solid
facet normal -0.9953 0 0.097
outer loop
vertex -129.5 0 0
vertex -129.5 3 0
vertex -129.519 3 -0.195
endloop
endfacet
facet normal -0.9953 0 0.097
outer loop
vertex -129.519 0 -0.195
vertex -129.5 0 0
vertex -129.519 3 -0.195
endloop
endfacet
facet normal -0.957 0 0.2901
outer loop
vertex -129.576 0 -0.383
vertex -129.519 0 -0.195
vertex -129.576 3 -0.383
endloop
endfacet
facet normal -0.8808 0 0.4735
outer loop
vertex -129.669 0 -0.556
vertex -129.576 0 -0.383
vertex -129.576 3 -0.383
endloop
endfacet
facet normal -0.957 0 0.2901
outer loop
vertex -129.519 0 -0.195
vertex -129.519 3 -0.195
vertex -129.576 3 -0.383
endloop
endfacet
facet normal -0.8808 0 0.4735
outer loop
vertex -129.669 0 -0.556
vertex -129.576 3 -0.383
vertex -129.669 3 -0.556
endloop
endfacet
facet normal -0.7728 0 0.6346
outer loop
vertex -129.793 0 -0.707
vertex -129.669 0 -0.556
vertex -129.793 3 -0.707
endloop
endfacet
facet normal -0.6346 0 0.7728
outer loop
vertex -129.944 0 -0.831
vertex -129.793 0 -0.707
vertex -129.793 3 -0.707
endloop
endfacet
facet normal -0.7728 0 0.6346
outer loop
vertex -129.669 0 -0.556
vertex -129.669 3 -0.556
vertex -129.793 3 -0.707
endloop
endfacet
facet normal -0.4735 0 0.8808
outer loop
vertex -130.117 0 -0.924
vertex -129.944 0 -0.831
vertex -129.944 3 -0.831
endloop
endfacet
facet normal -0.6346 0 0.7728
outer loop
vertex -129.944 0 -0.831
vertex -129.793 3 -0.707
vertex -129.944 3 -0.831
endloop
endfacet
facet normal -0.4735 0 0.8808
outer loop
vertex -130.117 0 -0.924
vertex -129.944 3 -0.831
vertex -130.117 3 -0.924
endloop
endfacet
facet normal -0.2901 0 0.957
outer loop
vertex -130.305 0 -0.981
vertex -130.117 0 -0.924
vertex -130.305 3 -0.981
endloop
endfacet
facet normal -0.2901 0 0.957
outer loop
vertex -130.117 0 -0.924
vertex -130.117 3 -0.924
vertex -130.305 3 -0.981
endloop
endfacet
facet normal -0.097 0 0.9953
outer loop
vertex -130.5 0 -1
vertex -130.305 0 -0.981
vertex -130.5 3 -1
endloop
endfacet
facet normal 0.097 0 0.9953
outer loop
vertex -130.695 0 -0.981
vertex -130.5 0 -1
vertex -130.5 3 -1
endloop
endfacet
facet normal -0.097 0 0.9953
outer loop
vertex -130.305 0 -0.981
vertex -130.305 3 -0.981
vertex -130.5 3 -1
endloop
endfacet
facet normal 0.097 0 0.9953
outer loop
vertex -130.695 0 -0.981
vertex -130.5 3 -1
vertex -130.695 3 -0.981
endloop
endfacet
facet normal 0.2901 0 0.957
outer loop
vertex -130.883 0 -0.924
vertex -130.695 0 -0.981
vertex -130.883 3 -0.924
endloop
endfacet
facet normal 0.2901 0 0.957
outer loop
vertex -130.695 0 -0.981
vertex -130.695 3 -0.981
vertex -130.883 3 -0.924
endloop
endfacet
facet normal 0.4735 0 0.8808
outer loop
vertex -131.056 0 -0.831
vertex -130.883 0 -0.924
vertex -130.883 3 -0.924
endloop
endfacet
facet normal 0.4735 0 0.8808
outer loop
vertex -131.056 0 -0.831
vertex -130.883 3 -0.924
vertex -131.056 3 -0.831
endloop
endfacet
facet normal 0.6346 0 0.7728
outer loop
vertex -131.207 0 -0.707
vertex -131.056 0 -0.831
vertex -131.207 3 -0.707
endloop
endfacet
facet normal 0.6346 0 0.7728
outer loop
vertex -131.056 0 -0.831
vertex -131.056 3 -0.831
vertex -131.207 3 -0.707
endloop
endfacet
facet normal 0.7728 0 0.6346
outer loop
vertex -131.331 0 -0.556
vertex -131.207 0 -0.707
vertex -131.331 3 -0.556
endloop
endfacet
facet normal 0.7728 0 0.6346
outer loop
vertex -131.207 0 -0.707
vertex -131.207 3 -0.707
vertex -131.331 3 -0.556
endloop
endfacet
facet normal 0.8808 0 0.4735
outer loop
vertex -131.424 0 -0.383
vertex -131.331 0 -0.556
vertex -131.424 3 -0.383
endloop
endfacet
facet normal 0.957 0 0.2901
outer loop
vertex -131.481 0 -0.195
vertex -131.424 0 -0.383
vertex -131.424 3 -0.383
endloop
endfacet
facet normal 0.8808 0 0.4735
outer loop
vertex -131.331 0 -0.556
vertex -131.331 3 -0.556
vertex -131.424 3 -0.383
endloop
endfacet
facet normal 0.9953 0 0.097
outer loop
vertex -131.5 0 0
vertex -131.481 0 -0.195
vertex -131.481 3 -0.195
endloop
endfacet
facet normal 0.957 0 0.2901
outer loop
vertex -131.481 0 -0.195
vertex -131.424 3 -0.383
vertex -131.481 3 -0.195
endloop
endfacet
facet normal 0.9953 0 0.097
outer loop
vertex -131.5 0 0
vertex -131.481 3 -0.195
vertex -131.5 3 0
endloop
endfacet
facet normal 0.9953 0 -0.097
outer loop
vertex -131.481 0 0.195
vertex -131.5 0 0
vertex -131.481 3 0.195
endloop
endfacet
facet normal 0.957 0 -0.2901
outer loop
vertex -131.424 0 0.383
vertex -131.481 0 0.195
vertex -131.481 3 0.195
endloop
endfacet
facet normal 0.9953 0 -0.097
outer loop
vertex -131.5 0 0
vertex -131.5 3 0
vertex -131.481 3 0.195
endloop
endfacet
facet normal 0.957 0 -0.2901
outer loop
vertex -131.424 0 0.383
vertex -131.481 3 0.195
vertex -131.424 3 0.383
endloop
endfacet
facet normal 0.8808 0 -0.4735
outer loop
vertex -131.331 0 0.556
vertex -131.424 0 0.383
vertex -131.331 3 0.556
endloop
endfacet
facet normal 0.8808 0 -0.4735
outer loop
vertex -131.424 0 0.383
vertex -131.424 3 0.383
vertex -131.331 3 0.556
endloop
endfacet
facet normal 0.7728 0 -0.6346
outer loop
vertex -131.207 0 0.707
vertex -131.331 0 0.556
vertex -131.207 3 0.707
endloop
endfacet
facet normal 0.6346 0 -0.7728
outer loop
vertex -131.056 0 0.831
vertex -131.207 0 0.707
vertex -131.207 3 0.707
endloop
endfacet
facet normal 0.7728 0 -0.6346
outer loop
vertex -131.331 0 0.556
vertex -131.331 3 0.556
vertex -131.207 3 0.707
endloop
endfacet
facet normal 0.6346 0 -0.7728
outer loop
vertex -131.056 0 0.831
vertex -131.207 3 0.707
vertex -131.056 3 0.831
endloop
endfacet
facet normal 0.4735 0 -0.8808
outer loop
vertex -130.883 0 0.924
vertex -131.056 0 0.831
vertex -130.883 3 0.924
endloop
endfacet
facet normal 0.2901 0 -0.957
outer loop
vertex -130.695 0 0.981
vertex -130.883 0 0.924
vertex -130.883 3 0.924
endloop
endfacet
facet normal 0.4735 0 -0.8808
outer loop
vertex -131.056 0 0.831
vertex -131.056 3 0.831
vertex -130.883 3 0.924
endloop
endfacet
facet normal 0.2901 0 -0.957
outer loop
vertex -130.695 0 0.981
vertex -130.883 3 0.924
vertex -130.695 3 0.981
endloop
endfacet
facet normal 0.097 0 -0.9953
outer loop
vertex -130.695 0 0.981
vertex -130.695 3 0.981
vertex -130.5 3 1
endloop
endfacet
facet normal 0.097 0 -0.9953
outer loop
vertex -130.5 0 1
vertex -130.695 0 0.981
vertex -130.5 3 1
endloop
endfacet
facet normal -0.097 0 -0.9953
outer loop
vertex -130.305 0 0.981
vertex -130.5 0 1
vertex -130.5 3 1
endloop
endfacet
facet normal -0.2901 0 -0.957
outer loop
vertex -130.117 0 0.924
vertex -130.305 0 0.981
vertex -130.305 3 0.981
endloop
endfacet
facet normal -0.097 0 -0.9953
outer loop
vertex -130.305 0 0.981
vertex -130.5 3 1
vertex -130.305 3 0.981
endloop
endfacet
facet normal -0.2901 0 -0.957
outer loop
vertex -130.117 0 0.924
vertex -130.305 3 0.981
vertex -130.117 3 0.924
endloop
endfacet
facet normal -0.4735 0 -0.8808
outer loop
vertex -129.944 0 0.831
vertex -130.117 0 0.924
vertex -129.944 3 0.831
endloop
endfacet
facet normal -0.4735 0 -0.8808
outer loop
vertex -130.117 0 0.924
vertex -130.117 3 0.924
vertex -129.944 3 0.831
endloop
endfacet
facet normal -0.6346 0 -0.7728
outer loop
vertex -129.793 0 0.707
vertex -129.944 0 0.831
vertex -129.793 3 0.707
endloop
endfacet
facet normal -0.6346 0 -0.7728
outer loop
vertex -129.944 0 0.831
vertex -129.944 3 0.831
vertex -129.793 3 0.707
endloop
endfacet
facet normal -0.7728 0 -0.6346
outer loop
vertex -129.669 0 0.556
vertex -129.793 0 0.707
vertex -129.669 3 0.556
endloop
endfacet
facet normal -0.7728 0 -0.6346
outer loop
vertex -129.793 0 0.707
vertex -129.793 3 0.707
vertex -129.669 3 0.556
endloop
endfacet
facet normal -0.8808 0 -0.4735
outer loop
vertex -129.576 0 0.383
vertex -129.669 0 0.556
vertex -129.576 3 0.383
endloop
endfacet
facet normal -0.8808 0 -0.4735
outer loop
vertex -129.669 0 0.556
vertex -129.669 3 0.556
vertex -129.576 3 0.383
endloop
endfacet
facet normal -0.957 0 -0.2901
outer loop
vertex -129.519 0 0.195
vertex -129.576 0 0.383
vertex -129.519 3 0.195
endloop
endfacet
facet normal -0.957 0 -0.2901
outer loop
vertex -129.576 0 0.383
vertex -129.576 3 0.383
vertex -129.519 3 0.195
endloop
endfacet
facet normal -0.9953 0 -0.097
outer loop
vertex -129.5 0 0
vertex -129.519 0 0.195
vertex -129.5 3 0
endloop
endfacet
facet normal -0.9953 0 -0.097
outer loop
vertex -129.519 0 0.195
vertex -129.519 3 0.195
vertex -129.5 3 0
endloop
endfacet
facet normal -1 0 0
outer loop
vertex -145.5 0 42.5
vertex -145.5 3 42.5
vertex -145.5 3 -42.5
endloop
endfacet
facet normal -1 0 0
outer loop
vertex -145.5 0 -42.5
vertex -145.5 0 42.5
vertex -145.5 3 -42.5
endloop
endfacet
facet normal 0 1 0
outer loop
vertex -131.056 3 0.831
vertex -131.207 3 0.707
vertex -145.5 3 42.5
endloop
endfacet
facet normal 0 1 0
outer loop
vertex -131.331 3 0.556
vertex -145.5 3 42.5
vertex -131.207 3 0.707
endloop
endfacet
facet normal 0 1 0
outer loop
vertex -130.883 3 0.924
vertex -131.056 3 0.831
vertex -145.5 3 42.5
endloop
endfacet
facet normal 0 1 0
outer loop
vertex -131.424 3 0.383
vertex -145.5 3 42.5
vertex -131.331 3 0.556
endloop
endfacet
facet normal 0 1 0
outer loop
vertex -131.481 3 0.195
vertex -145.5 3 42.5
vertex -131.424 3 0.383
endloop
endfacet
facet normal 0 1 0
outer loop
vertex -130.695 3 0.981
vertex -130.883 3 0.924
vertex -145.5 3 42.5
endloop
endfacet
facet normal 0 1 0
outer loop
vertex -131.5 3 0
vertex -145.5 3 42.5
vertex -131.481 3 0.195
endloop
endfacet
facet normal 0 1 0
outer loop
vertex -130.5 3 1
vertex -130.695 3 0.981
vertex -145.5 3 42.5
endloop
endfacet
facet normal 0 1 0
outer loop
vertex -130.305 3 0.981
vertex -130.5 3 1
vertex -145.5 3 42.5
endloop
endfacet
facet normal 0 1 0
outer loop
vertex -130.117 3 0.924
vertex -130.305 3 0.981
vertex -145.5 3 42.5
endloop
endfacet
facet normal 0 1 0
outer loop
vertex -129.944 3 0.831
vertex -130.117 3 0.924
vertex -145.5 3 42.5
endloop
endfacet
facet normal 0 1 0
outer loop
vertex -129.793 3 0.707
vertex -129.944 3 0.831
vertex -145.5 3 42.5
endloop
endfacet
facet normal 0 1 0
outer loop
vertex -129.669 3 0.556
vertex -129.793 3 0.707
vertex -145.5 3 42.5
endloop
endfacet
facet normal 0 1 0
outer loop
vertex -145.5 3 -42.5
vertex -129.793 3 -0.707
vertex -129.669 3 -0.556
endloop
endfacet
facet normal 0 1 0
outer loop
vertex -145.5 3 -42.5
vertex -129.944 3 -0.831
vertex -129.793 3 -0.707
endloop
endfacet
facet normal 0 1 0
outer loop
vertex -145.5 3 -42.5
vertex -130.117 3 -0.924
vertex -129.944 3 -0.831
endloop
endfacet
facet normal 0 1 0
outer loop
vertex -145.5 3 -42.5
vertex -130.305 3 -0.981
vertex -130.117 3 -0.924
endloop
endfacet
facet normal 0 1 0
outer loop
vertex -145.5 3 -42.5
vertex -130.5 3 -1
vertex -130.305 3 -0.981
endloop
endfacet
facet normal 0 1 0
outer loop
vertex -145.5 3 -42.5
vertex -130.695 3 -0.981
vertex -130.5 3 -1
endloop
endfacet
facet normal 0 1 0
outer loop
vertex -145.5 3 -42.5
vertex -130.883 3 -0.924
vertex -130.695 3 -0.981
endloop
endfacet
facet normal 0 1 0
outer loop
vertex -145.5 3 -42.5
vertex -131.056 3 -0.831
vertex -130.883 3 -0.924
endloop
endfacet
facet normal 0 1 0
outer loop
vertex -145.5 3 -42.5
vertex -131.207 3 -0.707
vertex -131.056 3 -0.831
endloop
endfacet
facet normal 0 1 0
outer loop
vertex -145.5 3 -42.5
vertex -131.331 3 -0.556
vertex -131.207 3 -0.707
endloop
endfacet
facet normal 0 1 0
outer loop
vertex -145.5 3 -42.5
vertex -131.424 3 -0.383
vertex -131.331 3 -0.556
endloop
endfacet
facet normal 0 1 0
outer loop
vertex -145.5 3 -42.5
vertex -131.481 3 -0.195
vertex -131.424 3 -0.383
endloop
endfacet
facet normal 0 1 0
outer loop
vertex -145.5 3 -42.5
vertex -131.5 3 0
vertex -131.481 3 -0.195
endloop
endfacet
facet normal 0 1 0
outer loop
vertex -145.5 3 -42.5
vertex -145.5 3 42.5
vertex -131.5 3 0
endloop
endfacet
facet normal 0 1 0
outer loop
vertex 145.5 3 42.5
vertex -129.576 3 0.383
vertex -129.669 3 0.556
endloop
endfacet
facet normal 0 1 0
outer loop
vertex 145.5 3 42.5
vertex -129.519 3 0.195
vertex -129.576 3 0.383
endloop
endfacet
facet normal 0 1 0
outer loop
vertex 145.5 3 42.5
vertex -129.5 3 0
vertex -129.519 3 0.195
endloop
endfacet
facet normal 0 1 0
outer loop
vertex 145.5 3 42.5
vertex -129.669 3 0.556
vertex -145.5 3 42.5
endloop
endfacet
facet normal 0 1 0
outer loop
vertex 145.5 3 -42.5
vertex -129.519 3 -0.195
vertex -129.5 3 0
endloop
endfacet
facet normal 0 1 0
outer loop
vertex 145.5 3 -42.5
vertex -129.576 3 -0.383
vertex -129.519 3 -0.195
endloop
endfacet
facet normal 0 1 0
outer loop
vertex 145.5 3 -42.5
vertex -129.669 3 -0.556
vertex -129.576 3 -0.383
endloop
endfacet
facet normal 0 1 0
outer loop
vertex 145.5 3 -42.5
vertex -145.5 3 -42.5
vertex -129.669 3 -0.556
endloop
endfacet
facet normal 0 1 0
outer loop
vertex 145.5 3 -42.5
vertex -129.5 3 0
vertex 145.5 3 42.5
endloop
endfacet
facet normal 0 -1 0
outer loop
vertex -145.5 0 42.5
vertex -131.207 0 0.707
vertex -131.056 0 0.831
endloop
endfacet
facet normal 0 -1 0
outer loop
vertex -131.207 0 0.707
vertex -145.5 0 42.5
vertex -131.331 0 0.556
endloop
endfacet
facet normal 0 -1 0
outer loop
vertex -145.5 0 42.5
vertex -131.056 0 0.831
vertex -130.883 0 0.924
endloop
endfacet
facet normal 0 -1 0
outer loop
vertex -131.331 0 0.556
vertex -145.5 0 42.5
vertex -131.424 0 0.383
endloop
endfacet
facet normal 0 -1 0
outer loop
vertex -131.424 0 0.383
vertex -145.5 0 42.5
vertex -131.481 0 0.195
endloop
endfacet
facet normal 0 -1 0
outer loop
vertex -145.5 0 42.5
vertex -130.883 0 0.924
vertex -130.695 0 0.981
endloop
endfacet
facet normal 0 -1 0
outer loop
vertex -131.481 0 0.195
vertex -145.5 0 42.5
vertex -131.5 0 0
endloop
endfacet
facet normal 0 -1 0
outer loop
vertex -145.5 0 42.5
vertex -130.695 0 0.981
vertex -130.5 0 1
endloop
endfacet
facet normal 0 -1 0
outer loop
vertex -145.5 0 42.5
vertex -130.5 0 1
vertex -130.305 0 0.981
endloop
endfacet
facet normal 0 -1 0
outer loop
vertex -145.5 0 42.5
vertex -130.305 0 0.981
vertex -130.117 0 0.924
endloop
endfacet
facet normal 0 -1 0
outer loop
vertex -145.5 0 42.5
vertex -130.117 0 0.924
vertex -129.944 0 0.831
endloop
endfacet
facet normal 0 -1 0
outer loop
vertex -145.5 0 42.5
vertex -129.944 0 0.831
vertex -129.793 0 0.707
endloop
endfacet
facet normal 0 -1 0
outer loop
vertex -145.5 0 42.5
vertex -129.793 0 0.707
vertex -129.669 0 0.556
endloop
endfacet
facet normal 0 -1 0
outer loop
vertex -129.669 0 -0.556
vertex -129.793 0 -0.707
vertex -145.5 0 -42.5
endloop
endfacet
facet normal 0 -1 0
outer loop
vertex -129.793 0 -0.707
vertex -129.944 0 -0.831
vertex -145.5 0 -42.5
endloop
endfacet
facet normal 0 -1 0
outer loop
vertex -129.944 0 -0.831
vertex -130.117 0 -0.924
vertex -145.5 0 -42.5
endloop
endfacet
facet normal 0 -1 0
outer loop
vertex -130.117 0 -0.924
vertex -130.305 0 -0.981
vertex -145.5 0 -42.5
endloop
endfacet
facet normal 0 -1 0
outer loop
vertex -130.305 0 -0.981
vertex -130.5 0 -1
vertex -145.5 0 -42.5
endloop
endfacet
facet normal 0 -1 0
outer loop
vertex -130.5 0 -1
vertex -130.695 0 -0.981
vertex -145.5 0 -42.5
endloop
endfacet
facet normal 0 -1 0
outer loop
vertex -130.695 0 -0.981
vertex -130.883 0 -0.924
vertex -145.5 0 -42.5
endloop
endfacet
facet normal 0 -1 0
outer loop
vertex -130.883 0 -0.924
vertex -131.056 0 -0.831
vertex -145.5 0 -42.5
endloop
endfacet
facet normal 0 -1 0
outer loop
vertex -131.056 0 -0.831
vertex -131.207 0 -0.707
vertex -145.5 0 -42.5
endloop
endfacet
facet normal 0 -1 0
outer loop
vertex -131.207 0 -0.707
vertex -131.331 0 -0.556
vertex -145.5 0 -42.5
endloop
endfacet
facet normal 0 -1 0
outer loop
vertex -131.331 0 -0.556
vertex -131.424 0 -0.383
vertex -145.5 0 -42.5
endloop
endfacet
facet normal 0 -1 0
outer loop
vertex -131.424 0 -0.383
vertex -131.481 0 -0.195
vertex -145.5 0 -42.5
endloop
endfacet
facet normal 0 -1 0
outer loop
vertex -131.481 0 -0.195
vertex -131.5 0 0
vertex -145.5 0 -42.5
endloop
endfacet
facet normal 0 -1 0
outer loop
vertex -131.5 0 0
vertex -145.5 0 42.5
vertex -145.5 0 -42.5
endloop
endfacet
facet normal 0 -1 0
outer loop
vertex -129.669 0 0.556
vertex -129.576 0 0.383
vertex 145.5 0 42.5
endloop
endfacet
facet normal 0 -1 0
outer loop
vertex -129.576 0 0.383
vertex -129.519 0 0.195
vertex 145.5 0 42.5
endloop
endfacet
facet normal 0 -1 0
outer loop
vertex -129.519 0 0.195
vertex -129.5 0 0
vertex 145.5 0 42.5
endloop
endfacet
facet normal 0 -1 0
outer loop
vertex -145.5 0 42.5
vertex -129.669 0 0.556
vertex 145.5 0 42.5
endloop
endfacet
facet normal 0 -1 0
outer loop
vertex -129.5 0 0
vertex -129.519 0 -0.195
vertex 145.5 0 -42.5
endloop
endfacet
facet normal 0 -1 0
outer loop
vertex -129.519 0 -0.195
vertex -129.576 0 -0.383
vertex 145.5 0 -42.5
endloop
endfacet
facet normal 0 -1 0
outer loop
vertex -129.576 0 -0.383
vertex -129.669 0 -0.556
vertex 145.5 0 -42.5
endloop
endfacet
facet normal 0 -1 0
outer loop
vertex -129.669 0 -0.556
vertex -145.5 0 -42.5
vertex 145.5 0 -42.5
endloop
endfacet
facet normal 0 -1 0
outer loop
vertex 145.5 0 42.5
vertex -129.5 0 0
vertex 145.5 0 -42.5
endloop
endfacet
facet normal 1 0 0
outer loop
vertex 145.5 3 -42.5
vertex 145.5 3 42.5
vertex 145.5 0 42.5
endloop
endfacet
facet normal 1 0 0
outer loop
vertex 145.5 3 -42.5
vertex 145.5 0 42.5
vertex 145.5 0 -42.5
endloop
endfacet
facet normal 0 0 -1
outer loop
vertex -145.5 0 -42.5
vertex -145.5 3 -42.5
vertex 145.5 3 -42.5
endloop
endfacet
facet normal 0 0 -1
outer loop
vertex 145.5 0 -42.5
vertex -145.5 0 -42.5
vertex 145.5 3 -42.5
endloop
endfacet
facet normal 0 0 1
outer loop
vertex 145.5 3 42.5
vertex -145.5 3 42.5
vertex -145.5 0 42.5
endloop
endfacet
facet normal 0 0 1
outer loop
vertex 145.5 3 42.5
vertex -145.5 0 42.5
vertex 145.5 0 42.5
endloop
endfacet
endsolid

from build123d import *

# Parameters (mm, degrees)
SKETCH1_W           = 291
SKETCH1_H           = 85
SKETCH1_R           = 1
BOSS_EXTRUDE1_DEPTH = 3


with BuildPart() as part:
    # Sketch1 → Boss-Extrude1 (new body)
    with BuildSketch(Plane(origin=(0, 3, 0), x_dir=(1, 0, 0), z_dir=(0, 1, 0))):
        Rectangle(SKETCH1_W, SKETCH1_H)
        with Locations((-130.5, 0)):
            Circle(SKETCH1_R, mode=Mode.SUBTRACT)
    extrude(amount=-BOSS_EXTRUDE1_DEPTH)


solid = part.part
